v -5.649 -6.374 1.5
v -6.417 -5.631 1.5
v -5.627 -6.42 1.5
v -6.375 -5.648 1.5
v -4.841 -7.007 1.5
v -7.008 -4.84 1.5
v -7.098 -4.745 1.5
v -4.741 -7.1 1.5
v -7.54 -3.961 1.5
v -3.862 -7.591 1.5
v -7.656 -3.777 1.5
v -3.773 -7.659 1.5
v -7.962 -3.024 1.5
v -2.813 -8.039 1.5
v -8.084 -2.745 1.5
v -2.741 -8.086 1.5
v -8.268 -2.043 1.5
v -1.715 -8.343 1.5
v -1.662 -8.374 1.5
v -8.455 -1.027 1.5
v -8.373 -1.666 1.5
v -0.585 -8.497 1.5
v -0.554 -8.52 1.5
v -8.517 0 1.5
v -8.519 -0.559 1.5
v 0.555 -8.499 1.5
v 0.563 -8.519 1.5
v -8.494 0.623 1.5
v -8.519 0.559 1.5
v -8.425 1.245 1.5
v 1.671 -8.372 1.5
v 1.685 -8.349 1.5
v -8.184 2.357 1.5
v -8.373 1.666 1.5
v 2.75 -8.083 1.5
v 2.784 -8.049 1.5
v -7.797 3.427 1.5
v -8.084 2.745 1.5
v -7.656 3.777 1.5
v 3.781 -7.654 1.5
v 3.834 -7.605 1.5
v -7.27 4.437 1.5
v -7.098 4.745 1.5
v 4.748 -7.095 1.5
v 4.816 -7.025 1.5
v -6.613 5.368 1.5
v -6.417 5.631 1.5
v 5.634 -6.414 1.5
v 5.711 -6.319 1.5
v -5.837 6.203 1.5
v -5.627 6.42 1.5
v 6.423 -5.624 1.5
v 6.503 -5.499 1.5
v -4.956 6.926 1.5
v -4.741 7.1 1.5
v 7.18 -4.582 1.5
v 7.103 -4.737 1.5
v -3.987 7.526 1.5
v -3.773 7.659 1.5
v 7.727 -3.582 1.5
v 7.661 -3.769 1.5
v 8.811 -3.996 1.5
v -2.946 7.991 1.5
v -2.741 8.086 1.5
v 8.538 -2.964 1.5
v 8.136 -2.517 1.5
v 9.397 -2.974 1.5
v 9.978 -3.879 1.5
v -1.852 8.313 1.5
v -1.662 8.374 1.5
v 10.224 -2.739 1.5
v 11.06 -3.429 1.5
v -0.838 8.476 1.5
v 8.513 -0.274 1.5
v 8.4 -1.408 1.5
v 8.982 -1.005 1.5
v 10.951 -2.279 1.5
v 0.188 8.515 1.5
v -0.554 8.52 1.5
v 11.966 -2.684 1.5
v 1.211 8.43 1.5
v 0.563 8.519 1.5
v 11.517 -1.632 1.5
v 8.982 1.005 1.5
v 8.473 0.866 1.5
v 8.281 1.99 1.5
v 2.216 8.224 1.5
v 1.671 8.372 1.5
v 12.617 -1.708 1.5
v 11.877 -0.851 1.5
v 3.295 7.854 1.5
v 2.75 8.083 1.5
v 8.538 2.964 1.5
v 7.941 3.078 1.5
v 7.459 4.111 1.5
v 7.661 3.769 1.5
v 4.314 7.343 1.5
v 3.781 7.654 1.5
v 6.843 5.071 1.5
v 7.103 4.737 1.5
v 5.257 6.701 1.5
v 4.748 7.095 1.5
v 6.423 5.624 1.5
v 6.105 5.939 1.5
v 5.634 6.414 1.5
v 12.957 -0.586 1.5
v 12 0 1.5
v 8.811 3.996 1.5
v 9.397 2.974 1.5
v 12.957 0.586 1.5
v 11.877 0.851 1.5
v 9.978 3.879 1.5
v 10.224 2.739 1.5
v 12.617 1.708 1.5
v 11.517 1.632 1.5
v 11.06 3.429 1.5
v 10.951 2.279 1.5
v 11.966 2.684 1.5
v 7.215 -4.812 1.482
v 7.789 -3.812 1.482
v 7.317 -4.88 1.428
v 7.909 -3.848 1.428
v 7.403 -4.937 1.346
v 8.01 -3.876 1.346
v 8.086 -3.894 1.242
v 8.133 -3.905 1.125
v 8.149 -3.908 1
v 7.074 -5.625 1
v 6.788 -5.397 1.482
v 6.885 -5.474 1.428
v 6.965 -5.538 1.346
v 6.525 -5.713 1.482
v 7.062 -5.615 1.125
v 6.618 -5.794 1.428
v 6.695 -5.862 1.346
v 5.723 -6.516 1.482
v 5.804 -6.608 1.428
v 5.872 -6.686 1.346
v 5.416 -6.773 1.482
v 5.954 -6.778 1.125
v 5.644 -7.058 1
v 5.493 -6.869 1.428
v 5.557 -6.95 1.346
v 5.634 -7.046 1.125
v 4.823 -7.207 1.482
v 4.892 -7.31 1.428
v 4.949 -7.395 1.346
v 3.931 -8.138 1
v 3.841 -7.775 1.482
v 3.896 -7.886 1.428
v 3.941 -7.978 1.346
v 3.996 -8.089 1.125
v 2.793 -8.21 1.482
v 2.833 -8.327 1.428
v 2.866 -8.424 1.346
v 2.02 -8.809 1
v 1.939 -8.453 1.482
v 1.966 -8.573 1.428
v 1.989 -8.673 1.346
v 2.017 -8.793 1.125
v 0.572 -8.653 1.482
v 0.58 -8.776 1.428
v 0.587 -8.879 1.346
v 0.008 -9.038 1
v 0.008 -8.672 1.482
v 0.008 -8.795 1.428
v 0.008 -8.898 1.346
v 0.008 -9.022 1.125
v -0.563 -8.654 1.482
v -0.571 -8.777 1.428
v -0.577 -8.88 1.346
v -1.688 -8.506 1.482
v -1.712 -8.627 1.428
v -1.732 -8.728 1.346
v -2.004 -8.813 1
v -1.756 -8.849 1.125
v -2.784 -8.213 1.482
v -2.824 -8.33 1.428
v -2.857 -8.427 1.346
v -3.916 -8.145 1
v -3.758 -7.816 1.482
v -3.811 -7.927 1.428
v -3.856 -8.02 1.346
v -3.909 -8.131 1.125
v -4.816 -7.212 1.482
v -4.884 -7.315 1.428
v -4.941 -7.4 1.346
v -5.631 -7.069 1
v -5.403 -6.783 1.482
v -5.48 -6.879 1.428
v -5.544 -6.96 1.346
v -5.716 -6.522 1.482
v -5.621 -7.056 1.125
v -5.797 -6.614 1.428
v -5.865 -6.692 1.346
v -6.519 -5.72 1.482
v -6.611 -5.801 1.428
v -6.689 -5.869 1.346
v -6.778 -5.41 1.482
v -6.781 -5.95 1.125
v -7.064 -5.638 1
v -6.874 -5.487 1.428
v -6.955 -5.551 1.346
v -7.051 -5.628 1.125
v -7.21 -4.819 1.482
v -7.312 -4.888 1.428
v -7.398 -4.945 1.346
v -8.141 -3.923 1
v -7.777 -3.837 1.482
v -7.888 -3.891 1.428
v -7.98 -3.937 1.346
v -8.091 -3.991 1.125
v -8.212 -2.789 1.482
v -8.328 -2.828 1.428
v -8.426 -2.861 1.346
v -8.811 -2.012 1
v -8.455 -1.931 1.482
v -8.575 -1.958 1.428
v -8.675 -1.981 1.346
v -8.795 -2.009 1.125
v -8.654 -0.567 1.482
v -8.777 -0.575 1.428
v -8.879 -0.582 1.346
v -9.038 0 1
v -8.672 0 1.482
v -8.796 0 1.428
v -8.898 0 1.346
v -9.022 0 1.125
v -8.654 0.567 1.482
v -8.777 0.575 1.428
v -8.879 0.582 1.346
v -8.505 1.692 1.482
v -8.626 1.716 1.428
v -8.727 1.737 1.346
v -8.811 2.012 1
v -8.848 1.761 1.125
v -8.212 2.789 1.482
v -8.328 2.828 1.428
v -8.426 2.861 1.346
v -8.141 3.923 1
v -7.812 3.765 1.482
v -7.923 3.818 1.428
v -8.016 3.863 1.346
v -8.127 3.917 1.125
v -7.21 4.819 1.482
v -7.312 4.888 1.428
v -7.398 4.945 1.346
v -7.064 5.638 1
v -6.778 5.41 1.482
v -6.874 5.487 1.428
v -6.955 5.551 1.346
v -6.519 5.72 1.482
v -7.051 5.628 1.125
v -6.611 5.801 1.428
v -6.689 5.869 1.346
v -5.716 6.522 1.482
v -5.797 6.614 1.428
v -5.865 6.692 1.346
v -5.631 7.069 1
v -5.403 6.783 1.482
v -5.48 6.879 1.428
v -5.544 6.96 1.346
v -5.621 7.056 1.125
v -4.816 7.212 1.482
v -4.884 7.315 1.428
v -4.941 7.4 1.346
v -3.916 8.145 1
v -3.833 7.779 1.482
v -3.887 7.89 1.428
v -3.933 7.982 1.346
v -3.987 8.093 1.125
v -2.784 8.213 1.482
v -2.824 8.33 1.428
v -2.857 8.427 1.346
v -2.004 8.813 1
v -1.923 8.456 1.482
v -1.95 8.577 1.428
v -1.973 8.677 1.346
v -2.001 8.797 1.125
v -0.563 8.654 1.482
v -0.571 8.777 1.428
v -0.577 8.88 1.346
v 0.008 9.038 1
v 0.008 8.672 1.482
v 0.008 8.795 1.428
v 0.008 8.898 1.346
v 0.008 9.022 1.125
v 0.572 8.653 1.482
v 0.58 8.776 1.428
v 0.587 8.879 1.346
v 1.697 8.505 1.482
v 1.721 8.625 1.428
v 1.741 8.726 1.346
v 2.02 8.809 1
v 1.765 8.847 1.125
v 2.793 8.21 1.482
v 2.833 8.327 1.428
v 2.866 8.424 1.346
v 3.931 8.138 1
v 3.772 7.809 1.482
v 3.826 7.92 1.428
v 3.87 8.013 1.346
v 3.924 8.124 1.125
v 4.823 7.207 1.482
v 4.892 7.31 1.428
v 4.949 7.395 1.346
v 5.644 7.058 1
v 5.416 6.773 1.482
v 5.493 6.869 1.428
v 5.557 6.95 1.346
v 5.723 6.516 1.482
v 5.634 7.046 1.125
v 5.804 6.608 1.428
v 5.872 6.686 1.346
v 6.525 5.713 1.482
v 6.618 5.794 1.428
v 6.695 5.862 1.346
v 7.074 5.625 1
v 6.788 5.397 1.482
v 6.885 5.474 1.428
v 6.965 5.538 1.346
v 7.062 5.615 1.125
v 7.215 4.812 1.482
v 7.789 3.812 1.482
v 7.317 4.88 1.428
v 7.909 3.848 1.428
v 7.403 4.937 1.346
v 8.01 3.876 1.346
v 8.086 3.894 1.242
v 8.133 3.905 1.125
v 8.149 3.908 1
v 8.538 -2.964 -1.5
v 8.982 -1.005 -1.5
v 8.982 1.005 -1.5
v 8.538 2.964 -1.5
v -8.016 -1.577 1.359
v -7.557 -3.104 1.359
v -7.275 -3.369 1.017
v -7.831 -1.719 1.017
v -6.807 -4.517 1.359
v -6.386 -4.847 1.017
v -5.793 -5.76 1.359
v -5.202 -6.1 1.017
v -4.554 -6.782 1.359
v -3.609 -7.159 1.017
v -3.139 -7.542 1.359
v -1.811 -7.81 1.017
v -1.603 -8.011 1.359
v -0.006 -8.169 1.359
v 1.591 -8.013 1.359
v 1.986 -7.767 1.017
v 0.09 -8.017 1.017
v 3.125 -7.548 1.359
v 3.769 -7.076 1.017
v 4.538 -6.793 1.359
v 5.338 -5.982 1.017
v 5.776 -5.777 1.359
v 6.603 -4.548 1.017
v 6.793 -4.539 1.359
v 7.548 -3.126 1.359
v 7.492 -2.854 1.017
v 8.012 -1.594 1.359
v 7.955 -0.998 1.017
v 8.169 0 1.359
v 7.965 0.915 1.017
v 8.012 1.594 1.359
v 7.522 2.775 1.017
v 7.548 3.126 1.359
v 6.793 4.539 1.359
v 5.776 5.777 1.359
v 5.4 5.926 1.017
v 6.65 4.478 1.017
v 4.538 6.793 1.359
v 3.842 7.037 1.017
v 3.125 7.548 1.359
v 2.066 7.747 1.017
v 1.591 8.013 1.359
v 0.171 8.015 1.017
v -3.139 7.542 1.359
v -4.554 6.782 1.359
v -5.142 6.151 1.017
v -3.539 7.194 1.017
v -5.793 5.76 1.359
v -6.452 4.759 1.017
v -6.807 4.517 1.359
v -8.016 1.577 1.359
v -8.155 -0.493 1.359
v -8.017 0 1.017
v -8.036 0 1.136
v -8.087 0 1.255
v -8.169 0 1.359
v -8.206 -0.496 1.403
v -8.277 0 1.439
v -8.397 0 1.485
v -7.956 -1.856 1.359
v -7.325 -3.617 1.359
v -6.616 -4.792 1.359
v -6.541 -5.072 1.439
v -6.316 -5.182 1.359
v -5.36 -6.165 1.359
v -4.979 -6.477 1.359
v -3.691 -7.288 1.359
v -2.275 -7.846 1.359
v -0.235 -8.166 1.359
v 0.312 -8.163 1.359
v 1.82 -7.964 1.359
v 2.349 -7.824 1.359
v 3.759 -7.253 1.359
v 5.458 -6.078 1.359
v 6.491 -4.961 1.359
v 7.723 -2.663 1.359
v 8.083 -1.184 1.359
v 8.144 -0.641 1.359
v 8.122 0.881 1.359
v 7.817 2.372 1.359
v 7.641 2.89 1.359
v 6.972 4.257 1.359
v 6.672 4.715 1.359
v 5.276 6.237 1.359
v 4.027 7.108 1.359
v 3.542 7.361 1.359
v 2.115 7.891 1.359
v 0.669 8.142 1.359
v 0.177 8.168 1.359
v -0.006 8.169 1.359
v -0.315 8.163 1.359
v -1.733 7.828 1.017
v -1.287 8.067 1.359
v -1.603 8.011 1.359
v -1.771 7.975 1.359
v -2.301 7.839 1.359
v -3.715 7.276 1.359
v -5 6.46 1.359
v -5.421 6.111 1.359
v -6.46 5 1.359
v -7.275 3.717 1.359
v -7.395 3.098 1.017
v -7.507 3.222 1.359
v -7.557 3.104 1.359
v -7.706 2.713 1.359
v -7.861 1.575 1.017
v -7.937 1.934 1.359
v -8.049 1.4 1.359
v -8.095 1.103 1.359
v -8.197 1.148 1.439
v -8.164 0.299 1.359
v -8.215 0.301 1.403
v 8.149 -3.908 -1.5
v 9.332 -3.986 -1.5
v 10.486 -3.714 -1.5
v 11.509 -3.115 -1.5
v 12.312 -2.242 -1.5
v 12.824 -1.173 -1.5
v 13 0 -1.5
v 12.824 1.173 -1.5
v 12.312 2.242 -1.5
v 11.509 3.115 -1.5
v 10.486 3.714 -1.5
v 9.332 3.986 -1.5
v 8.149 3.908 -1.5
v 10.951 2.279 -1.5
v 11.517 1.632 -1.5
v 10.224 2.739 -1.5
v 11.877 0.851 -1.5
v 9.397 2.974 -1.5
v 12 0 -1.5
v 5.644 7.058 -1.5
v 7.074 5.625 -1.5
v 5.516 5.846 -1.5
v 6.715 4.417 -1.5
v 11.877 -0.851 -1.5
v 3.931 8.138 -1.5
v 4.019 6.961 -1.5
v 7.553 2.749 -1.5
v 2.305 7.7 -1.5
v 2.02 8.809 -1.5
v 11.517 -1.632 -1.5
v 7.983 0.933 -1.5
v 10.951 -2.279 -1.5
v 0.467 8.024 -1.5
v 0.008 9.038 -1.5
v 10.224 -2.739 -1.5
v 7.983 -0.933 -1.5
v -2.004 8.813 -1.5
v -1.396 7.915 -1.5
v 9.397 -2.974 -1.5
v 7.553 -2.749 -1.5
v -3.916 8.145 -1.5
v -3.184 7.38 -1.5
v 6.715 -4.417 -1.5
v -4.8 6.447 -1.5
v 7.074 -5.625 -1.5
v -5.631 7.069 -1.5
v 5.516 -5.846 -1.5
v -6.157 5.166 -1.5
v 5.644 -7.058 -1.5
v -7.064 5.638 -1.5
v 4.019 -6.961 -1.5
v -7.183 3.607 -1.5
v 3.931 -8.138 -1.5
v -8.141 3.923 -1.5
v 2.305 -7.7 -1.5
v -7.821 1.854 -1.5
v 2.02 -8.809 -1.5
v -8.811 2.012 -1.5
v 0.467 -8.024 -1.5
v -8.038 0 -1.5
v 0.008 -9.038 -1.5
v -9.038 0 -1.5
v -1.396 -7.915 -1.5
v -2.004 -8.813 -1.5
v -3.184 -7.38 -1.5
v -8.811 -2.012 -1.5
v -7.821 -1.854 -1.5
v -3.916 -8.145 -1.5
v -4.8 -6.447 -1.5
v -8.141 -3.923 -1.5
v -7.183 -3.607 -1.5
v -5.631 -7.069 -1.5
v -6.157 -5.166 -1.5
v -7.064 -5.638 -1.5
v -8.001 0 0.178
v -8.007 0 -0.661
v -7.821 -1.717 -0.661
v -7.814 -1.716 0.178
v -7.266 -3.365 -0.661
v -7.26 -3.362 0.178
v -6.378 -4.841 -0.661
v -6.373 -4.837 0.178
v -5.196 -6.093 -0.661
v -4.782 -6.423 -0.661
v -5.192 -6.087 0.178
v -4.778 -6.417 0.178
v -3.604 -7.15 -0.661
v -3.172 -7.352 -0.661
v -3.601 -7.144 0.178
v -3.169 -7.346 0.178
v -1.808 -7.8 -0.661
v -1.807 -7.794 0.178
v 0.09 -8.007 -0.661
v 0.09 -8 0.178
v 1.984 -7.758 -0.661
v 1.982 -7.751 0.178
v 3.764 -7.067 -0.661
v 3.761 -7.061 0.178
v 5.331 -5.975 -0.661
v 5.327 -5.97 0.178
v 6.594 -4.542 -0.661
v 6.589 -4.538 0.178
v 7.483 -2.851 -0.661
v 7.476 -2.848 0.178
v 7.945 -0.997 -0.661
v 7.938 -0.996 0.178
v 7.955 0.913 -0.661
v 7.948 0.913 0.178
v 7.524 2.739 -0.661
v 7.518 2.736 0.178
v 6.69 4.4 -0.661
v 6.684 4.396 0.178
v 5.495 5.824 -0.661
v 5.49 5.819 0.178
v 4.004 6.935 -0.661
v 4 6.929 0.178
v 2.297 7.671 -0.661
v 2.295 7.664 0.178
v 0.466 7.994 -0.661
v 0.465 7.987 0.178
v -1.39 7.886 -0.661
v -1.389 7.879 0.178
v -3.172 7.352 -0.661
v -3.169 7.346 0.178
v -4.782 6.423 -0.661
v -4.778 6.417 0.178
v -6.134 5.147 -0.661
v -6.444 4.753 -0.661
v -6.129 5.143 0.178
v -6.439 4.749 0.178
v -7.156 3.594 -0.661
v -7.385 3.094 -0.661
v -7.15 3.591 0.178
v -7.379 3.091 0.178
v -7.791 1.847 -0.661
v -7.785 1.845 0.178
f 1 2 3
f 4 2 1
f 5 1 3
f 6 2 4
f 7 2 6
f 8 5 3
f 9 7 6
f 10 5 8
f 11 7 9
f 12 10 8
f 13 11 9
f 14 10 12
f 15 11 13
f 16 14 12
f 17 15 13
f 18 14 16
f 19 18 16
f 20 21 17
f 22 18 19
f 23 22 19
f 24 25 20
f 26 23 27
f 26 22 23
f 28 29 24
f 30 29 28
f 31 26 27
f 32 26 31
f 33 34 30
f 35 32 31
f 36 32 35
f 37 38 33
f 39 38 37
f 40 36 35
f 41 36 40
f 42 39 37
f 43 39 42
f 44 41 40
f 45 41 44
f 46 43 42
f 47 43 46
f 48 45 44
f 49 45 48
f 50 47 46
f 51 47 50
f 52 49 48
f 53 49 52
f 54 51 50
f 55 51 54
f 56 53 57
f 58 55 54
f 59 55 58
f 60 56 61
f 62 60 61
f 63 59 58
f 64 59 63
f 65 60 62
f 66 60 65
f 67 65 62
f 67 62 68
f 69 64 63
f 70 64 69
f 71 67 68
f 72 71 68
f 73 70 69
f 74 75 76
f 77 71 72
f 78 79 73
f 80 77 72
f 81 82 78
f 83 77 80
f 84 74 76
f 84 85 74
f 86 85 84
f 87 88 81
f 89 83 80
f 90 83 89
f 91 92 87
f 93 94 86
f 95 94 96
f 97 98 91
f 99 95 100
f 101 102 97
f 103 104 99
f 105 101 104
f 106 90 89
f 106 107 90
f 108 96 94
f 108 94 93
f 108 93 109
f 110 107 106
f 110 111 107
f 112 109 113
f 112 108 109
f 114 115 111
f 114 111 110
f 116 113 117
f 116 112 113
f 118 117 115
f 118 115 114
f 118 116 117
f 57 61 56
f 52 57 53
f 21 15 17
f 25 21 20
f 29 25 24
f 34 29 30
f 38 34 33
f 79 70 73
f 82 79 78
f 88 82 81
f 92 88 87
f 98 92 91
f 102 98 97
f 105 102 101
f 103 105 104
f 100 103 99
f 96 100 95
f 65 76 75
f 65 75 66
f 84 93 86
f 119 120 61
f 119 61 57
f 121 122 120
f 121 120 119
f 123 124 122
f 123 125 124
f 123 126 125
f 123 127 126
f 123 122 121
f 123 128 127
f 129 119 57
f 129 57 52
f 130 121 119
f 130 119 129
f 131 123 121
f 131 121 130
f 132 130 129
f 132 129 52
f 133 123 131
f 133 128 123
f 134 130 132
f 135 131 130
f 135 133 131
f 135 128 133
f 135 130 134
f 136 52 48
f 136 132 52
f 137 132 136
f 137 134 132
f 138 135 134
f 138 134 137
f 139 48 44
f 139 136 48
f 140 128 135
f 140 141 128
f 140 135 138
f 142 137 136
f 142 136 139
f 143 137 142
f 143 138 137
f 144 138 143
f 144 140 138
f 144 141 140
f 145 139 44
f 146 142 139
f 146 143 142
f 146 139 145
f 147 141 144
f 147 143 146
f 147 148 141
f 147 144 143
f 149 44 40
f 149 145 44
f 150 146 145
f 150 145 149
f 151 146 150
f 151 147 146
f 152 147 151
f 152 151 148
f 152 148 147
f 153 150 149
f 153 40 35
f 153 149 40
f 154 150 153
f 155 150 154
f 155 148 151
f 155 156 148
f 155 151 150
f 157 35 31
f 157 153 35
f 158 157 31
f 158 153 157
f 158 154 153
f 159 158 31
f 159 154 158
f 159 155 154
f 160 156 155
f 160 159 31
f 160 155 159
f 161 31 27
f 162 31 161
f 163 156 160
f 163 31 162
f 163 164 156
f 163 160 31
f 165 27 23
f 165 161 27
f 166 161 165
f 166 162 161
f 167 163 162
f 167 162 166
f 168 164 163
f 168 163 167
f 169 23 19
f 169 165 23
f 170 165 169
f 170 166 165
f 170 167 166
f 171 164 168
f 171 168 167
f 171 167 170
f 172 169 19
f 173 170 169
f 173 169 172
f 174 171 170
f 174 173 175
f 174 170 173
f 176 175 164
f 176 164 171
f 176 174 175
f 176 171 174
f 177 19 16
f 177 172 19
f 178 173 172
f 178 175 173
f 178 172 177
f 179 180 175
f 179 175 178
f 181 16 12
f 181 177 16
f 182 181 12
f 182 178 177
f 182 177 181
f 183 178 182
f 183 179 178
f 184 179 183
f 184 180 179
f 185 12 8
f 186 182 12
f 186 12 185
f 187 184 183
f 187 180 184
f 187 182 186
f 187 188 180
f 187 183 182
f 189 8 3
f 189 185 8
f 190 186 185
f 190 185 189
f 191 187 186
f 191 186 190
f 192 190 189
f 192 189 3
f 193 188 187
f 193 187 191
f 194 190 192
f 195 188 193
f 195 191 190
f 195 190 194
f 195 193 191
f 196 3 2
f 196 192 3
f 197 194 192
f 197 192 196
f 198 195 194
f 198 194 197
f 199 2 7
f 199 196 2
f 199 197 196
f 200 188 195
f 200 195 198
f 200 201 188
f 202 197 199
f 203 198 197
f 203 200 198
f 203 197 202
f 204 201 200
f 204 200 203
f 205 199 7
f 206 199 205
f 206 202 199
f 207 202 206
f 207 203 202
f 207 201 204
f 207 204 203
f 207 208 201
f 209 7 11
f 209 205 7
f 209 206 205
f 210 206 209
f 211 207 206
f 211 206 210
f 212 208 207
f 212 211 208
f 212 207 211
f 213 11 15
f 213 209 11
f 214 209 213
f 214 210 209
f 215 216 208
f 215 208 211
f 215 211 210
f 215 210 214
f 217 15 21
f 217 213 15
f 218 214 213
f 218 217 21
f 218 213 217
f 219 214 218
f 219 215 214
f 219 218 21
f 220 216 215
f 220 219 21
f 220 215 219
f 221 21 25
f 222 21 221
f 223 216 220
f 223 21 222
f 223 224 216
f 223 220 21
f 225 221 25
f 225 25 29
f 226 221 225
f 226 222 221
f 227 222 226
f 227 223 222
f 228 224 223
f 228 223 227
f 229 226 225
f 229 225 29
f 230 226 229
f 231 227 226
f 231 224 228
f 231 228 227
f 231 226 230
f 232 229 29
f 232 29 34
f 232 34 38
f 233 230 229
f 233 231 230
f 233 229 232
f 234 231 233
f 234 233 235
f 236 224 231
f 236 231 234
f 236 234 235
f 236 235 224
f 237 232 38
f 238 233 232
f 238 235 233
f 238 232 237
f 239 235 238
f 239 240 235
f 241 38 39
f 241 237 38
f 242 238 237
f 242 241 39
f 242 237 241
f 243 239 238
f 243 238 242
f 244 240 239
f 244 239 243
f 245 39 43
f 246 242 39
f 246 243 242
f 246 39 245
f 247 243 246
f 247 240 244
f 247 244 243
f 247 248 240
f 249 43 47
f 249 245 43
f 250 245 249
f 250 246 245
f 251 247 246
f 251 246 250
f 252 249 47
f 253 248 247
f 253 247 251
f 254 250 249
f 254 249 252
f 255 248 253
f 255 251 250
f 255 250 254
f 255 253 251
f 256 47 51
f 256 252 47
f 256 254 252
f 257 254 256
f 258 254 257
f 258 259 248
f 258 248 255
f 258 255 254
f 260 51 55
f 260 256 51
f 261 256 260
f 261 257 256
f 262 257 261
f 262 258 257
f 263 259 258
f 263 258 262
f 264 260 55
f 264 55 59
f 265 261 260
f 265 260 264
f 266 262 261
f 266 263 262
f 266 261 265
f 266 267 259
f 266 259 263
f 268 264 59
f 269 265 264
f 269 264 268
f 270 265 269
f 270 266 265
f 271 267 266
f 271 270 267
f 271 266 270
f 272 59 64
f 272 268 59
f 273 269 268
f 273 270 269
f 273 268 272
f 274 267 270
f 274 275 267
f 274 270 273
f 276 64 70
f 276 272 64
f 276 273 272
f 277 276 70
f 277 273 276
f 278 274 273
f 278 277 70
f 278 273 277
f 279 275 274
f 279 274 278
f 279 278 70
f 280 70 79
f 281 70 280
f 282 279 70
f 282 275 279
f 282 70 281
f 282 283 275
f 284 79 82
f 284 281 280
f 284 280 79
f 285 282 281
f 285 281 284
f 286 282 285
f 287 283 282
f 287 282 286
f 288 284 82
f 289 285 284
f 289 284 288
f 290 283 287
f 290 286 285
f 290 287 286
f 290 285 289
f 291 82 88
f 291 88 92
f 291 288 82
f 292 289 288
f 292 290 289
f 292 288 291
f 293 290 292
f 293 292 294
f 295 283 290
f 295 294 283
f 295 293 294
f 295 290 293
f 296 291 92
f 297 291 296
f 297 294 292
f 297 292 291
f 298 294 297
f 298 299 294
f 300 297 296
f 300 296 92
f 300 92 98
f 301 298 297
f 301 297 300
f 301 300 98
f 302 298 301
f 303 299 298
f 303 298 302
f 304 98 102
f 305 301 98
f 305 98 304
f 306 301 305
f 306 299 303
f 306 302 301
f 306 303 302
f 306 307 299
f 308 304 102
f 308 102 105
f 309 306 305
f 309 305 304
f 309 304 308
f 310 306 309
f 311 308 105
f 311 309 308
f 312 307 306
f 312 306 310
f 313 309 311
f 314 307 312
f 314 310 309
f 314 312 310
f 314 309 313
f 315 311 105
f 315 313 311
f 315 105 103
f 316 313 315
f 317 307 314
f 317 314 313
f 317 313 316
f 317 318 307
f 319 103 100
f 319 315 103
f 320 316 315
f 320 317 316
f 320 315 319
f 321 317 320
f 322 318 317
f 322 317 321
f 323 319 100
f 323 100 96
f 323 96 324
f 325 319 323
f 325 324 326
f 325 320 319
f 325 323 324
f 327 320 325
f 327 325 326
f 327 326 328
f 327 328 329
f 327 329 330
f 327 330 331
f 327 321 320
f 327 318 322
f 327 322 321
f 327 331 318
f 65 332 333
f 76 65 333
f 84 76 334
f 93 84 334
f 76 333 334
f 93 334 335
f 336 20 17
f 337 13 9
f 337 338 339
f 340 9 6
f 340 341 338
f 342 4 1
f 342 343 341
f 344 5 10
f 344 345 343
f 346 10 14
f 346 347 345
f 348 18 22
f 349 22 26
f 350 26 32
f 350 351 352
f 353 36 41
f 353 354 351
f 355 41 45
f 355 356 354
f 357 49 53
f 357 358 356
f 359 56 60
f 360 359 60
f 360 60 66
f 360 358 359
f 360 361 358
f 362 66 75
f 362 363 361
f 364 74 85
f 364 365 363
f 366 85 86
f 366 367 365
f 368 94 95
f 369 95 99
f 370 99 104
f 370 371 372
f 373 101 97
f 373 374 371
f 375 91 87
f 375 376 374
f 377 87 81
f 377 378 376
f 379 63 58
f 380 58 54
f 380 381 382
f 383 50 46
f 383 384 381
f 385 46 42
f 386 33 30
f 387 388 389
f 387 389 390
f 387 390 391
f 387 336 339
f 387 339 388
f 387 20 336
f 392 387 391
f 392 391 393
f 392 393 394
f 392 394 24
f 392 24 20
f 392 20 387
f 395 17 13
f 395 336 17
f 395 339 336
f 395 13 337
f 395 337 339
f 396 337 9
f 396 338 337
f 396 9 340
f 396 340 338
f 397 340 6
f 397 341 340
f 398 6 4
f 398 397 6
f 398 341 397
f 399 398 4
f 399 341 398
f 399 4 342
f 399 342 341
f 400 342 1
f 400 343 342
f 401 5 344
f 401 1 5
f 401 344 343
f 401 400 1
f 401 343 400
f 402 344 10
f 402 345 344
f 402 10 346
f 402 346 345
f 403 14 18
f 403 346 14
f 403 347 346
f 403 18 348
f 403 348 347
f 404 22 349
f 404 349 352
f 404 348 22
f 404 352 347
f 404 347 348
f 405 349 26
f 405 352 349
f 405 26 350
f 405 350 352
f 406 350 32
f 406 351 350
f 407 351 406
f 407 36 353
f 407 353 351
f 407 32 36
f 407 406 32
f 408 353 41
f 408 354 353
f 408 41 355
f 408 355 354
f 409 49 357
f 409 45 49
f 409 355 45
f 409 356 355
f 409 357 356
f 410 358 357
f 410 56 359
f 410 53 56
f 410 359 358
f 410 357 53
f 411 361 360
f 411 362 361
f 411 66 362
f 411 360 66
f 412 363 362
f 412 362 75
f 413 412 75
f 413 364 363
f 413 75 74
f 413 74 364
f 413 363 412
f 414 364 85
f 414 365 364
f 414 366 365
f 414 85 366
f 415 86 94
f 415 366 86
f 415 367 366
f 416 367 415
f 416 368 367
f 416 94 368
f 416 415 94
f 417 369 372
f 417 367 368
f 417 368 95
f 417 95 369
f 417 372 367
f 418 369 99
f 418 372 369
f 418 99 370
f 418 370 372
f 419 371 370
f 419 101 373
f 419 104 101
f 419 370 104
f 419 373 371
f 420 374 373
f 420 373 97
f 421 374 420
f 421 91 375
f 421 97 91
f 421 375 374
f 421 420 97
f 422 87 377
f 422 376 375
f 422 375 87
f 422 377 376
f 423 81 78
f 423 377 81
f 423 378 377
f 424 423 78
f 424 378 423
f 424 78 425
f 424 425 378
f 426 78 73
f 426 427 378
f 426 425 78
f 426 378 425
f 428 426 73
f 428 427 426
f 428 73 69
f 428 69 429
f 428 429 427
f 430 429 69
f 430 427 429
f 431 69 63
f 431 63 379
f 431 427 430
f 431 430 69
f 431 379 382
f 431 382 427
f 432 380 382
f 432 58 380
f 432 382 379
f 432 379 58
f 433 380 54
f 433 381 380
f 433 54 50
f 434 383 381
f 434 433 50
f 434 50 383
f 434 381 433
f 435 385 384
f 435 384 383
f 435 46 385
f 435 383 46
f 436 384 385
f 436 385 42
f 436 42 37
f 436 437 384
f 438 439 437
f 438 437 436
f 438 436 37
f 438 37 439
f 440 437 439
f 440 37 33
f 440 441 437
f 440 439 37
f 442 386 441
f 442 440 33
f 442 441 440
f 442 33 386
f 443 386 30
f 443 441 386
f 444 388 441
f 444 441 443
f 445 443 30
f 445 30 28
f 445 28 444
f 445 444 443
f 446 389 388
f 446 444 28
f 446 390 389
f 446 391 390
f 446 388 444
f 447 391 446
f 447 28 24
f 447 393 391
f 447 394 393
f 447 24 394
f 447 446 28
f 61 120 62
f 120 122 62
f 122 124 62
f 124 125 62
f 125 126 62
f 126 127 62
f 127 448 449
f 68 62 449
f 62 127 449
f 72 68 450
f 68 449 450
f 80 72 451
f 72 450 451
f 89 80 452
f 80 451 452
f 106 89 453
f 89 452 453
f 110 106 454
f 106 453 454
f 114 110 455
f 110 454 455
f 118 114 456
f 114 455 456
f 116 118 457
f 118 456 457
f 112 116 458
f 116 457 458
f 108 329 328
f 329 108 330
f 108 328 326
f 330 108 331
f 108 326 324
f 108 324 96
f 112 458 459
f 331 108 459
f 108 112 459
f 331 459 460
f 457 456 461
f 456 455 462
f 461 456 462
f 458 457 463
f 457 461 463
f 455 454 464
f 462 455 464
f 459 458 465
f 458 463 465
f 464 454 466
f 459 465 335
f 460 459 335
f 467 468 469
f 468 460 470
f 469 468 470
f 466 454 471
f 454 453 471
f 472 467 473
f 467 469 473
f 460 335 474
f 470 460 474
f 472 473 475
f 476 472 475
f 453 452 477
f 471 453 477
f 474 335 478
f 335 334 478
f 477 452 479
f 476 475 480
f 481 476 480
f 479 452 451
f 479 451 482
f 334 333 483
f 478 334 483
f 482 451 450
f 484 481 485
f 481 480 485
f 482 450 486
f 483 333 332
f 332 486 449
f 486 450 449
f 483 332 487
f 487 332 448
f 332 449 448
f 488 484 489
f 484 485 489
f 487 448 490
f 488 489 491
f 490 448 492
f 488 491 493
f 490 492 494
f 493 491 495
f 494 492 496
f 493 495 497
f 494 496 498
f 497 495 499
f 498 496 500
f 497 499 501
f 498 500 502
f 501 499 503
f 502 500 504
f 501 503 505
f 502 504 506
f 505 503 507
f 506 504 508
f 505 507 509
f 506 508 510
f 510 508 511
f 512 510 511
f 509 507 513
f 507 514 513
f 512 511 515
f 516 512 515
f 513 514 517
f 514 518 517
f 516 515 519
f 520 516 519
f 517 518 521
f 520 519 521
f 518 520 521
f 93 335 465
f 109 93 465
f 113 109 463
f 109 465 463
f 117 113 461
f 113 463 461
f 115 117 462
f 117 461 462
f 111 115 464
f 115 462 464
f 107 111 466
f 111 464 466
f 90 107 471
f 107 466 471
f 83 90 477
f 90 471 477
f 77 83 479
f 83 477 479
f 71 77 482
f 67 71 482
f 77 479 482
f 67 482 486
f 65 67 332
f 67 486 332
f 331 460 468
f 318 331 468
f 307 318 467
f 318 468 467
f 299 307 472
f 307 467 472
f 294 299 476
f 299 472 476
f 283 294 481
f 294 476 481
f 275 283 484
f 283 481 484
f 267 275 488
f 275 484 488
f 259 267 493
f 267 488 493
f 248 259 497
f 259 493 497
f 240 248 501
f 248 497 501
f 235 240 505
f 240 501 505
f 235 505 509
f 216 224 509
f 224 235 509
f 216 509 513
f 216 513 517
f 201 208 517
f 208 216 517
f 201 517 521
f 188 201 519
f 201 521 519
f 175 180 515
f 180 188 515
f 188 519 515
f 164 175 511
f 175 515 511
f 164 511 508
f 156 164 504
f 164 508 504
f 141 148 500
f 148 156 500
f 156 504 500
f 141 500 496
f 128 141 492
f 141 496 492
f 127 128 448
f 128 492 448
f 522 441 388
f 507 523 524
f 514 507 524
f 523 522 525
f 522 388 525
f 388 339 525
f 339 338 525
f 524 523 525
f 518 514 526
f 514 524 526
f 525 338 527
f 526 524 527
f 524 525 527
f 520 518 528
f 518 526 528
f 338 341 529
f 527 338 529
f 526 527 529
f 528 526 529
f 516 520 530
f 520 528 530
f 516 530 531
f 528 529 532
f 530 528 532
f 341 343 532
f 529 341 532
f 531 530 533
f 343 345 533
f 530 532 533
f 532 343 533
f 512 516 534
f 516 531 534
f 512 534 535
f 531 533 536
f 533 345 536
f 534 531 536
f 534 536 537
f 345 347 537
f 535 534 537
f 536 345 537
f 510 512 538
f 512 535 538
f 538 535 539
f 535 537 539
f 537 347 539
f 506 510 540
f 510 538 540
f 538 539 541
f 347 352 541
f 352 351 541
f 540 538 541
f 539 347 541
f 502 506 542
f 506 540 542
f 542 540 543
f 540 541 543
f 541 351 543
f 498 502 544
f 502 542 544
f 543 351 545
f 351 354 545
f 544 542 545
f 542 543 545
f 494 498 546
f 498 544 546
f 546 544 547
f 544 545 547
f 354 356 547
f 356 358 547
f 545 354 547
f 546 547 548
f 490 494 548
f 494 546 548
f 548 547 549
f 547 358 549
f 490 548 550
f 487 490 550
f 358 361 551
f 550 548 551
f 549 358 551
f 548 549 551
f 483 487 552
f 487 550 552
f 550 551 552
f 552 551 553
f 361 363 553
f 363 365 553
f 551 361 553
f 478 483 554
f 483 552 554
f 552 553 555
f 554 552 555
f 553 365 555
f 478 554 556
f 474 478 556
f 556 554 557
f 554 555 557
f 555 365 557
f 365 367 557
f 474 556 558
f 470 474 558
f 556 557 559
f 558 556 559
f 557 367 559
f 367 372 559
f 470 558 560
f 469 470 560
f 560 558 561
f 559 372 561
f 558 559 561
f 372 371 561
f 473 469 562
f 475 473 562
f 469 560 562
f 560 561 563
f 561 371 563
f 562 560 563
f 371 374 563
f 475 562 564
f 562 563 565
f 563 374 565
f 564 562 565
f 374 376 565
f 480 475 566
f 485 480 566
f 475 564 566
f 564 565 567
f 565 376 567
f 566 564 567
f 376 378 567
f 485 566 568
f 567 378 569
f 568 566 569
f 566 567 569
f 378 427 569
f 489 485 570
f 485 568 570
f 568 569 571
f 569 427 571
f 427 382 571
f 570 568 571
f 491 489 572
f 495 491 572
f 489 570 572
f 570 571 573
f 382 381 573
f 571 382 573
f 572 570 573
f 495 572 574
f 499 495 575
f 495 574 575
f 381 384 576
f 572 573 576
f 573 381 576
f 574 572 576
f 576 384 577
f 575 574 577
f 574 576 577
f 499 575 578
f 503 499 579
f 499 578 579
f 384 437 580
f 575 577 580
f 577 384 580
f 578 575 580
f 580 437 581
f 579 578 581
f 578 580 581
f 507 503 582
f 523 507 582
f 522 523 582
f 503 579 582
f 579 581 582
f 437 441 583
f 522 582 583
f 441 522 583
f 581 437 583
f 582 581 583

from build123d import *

# Parameters (mm, degrees)
F4_DEPTH = 1.5
F5_DEPTH = 1.5
F6_R     = 0.5


with BuildPart() as f2:
    # F1 (on Front) → F2 (revolve)
    with BuildSketch(Plane.XZ):
        with BuildLine():
            Line((-8.0375234668, 1.5), (-9.0375234668, 1.5))
            Line((-9.0375234668, 1.5), (-9.0375234668, -1.5))
            Line((-9.0375234668, -1.5), (-8.0375234668, -1.5))
            ThreePointArc((-8.0375234668, -1.5), (-8, 0), (-8.0375234668, 1.5))
        make_face()
    revolve(axis=Axis((0, 0, 9.5071946271), (0, 0, 1)))

    # F3 (on Top) → F4 (join)
    with BuildSketch(Plane.XY):
        with BuildLine():
            ThreePointArc((8.5376016897, -2.9641504352), (8.3565039155, -3.4417543091), (8.1487128008, -3.9083641213))
            ThreePointArc((8.1487128008, -3.9083641213), (13, 0), (8.1487128008, 3.9083641213))
            ThreePointArc((8.1487128008, 3.9083641213), (8.3565039155, 3.4417543091), (8.5376016897, 2.9641504352))
            ThreePointArc((8.5376016897, 2.9641504352), (12, 0), (8.5376016897, -2.9641504352))
        make_face()
    extrude(amount=-F4_DEPTH)

    # F5 (add): a face of the model
    f5_faces = [f2.faces().sort_by_distance(p)[0] for p in [
        (8.4430138573, 3.4773847555, 0),
    ]]
    extrude(f5_faces, amount=F5_DEPTH)

    # F6
    f6_edges = [f2.edges().sort_by_distance(p)[0] for p in [
        (-9.037523, 0, 1.5),
        (8.037523, 0, 1.5),
    ]]
    fillet(f6_edges, radius=F6_R)


solid = f2.part
